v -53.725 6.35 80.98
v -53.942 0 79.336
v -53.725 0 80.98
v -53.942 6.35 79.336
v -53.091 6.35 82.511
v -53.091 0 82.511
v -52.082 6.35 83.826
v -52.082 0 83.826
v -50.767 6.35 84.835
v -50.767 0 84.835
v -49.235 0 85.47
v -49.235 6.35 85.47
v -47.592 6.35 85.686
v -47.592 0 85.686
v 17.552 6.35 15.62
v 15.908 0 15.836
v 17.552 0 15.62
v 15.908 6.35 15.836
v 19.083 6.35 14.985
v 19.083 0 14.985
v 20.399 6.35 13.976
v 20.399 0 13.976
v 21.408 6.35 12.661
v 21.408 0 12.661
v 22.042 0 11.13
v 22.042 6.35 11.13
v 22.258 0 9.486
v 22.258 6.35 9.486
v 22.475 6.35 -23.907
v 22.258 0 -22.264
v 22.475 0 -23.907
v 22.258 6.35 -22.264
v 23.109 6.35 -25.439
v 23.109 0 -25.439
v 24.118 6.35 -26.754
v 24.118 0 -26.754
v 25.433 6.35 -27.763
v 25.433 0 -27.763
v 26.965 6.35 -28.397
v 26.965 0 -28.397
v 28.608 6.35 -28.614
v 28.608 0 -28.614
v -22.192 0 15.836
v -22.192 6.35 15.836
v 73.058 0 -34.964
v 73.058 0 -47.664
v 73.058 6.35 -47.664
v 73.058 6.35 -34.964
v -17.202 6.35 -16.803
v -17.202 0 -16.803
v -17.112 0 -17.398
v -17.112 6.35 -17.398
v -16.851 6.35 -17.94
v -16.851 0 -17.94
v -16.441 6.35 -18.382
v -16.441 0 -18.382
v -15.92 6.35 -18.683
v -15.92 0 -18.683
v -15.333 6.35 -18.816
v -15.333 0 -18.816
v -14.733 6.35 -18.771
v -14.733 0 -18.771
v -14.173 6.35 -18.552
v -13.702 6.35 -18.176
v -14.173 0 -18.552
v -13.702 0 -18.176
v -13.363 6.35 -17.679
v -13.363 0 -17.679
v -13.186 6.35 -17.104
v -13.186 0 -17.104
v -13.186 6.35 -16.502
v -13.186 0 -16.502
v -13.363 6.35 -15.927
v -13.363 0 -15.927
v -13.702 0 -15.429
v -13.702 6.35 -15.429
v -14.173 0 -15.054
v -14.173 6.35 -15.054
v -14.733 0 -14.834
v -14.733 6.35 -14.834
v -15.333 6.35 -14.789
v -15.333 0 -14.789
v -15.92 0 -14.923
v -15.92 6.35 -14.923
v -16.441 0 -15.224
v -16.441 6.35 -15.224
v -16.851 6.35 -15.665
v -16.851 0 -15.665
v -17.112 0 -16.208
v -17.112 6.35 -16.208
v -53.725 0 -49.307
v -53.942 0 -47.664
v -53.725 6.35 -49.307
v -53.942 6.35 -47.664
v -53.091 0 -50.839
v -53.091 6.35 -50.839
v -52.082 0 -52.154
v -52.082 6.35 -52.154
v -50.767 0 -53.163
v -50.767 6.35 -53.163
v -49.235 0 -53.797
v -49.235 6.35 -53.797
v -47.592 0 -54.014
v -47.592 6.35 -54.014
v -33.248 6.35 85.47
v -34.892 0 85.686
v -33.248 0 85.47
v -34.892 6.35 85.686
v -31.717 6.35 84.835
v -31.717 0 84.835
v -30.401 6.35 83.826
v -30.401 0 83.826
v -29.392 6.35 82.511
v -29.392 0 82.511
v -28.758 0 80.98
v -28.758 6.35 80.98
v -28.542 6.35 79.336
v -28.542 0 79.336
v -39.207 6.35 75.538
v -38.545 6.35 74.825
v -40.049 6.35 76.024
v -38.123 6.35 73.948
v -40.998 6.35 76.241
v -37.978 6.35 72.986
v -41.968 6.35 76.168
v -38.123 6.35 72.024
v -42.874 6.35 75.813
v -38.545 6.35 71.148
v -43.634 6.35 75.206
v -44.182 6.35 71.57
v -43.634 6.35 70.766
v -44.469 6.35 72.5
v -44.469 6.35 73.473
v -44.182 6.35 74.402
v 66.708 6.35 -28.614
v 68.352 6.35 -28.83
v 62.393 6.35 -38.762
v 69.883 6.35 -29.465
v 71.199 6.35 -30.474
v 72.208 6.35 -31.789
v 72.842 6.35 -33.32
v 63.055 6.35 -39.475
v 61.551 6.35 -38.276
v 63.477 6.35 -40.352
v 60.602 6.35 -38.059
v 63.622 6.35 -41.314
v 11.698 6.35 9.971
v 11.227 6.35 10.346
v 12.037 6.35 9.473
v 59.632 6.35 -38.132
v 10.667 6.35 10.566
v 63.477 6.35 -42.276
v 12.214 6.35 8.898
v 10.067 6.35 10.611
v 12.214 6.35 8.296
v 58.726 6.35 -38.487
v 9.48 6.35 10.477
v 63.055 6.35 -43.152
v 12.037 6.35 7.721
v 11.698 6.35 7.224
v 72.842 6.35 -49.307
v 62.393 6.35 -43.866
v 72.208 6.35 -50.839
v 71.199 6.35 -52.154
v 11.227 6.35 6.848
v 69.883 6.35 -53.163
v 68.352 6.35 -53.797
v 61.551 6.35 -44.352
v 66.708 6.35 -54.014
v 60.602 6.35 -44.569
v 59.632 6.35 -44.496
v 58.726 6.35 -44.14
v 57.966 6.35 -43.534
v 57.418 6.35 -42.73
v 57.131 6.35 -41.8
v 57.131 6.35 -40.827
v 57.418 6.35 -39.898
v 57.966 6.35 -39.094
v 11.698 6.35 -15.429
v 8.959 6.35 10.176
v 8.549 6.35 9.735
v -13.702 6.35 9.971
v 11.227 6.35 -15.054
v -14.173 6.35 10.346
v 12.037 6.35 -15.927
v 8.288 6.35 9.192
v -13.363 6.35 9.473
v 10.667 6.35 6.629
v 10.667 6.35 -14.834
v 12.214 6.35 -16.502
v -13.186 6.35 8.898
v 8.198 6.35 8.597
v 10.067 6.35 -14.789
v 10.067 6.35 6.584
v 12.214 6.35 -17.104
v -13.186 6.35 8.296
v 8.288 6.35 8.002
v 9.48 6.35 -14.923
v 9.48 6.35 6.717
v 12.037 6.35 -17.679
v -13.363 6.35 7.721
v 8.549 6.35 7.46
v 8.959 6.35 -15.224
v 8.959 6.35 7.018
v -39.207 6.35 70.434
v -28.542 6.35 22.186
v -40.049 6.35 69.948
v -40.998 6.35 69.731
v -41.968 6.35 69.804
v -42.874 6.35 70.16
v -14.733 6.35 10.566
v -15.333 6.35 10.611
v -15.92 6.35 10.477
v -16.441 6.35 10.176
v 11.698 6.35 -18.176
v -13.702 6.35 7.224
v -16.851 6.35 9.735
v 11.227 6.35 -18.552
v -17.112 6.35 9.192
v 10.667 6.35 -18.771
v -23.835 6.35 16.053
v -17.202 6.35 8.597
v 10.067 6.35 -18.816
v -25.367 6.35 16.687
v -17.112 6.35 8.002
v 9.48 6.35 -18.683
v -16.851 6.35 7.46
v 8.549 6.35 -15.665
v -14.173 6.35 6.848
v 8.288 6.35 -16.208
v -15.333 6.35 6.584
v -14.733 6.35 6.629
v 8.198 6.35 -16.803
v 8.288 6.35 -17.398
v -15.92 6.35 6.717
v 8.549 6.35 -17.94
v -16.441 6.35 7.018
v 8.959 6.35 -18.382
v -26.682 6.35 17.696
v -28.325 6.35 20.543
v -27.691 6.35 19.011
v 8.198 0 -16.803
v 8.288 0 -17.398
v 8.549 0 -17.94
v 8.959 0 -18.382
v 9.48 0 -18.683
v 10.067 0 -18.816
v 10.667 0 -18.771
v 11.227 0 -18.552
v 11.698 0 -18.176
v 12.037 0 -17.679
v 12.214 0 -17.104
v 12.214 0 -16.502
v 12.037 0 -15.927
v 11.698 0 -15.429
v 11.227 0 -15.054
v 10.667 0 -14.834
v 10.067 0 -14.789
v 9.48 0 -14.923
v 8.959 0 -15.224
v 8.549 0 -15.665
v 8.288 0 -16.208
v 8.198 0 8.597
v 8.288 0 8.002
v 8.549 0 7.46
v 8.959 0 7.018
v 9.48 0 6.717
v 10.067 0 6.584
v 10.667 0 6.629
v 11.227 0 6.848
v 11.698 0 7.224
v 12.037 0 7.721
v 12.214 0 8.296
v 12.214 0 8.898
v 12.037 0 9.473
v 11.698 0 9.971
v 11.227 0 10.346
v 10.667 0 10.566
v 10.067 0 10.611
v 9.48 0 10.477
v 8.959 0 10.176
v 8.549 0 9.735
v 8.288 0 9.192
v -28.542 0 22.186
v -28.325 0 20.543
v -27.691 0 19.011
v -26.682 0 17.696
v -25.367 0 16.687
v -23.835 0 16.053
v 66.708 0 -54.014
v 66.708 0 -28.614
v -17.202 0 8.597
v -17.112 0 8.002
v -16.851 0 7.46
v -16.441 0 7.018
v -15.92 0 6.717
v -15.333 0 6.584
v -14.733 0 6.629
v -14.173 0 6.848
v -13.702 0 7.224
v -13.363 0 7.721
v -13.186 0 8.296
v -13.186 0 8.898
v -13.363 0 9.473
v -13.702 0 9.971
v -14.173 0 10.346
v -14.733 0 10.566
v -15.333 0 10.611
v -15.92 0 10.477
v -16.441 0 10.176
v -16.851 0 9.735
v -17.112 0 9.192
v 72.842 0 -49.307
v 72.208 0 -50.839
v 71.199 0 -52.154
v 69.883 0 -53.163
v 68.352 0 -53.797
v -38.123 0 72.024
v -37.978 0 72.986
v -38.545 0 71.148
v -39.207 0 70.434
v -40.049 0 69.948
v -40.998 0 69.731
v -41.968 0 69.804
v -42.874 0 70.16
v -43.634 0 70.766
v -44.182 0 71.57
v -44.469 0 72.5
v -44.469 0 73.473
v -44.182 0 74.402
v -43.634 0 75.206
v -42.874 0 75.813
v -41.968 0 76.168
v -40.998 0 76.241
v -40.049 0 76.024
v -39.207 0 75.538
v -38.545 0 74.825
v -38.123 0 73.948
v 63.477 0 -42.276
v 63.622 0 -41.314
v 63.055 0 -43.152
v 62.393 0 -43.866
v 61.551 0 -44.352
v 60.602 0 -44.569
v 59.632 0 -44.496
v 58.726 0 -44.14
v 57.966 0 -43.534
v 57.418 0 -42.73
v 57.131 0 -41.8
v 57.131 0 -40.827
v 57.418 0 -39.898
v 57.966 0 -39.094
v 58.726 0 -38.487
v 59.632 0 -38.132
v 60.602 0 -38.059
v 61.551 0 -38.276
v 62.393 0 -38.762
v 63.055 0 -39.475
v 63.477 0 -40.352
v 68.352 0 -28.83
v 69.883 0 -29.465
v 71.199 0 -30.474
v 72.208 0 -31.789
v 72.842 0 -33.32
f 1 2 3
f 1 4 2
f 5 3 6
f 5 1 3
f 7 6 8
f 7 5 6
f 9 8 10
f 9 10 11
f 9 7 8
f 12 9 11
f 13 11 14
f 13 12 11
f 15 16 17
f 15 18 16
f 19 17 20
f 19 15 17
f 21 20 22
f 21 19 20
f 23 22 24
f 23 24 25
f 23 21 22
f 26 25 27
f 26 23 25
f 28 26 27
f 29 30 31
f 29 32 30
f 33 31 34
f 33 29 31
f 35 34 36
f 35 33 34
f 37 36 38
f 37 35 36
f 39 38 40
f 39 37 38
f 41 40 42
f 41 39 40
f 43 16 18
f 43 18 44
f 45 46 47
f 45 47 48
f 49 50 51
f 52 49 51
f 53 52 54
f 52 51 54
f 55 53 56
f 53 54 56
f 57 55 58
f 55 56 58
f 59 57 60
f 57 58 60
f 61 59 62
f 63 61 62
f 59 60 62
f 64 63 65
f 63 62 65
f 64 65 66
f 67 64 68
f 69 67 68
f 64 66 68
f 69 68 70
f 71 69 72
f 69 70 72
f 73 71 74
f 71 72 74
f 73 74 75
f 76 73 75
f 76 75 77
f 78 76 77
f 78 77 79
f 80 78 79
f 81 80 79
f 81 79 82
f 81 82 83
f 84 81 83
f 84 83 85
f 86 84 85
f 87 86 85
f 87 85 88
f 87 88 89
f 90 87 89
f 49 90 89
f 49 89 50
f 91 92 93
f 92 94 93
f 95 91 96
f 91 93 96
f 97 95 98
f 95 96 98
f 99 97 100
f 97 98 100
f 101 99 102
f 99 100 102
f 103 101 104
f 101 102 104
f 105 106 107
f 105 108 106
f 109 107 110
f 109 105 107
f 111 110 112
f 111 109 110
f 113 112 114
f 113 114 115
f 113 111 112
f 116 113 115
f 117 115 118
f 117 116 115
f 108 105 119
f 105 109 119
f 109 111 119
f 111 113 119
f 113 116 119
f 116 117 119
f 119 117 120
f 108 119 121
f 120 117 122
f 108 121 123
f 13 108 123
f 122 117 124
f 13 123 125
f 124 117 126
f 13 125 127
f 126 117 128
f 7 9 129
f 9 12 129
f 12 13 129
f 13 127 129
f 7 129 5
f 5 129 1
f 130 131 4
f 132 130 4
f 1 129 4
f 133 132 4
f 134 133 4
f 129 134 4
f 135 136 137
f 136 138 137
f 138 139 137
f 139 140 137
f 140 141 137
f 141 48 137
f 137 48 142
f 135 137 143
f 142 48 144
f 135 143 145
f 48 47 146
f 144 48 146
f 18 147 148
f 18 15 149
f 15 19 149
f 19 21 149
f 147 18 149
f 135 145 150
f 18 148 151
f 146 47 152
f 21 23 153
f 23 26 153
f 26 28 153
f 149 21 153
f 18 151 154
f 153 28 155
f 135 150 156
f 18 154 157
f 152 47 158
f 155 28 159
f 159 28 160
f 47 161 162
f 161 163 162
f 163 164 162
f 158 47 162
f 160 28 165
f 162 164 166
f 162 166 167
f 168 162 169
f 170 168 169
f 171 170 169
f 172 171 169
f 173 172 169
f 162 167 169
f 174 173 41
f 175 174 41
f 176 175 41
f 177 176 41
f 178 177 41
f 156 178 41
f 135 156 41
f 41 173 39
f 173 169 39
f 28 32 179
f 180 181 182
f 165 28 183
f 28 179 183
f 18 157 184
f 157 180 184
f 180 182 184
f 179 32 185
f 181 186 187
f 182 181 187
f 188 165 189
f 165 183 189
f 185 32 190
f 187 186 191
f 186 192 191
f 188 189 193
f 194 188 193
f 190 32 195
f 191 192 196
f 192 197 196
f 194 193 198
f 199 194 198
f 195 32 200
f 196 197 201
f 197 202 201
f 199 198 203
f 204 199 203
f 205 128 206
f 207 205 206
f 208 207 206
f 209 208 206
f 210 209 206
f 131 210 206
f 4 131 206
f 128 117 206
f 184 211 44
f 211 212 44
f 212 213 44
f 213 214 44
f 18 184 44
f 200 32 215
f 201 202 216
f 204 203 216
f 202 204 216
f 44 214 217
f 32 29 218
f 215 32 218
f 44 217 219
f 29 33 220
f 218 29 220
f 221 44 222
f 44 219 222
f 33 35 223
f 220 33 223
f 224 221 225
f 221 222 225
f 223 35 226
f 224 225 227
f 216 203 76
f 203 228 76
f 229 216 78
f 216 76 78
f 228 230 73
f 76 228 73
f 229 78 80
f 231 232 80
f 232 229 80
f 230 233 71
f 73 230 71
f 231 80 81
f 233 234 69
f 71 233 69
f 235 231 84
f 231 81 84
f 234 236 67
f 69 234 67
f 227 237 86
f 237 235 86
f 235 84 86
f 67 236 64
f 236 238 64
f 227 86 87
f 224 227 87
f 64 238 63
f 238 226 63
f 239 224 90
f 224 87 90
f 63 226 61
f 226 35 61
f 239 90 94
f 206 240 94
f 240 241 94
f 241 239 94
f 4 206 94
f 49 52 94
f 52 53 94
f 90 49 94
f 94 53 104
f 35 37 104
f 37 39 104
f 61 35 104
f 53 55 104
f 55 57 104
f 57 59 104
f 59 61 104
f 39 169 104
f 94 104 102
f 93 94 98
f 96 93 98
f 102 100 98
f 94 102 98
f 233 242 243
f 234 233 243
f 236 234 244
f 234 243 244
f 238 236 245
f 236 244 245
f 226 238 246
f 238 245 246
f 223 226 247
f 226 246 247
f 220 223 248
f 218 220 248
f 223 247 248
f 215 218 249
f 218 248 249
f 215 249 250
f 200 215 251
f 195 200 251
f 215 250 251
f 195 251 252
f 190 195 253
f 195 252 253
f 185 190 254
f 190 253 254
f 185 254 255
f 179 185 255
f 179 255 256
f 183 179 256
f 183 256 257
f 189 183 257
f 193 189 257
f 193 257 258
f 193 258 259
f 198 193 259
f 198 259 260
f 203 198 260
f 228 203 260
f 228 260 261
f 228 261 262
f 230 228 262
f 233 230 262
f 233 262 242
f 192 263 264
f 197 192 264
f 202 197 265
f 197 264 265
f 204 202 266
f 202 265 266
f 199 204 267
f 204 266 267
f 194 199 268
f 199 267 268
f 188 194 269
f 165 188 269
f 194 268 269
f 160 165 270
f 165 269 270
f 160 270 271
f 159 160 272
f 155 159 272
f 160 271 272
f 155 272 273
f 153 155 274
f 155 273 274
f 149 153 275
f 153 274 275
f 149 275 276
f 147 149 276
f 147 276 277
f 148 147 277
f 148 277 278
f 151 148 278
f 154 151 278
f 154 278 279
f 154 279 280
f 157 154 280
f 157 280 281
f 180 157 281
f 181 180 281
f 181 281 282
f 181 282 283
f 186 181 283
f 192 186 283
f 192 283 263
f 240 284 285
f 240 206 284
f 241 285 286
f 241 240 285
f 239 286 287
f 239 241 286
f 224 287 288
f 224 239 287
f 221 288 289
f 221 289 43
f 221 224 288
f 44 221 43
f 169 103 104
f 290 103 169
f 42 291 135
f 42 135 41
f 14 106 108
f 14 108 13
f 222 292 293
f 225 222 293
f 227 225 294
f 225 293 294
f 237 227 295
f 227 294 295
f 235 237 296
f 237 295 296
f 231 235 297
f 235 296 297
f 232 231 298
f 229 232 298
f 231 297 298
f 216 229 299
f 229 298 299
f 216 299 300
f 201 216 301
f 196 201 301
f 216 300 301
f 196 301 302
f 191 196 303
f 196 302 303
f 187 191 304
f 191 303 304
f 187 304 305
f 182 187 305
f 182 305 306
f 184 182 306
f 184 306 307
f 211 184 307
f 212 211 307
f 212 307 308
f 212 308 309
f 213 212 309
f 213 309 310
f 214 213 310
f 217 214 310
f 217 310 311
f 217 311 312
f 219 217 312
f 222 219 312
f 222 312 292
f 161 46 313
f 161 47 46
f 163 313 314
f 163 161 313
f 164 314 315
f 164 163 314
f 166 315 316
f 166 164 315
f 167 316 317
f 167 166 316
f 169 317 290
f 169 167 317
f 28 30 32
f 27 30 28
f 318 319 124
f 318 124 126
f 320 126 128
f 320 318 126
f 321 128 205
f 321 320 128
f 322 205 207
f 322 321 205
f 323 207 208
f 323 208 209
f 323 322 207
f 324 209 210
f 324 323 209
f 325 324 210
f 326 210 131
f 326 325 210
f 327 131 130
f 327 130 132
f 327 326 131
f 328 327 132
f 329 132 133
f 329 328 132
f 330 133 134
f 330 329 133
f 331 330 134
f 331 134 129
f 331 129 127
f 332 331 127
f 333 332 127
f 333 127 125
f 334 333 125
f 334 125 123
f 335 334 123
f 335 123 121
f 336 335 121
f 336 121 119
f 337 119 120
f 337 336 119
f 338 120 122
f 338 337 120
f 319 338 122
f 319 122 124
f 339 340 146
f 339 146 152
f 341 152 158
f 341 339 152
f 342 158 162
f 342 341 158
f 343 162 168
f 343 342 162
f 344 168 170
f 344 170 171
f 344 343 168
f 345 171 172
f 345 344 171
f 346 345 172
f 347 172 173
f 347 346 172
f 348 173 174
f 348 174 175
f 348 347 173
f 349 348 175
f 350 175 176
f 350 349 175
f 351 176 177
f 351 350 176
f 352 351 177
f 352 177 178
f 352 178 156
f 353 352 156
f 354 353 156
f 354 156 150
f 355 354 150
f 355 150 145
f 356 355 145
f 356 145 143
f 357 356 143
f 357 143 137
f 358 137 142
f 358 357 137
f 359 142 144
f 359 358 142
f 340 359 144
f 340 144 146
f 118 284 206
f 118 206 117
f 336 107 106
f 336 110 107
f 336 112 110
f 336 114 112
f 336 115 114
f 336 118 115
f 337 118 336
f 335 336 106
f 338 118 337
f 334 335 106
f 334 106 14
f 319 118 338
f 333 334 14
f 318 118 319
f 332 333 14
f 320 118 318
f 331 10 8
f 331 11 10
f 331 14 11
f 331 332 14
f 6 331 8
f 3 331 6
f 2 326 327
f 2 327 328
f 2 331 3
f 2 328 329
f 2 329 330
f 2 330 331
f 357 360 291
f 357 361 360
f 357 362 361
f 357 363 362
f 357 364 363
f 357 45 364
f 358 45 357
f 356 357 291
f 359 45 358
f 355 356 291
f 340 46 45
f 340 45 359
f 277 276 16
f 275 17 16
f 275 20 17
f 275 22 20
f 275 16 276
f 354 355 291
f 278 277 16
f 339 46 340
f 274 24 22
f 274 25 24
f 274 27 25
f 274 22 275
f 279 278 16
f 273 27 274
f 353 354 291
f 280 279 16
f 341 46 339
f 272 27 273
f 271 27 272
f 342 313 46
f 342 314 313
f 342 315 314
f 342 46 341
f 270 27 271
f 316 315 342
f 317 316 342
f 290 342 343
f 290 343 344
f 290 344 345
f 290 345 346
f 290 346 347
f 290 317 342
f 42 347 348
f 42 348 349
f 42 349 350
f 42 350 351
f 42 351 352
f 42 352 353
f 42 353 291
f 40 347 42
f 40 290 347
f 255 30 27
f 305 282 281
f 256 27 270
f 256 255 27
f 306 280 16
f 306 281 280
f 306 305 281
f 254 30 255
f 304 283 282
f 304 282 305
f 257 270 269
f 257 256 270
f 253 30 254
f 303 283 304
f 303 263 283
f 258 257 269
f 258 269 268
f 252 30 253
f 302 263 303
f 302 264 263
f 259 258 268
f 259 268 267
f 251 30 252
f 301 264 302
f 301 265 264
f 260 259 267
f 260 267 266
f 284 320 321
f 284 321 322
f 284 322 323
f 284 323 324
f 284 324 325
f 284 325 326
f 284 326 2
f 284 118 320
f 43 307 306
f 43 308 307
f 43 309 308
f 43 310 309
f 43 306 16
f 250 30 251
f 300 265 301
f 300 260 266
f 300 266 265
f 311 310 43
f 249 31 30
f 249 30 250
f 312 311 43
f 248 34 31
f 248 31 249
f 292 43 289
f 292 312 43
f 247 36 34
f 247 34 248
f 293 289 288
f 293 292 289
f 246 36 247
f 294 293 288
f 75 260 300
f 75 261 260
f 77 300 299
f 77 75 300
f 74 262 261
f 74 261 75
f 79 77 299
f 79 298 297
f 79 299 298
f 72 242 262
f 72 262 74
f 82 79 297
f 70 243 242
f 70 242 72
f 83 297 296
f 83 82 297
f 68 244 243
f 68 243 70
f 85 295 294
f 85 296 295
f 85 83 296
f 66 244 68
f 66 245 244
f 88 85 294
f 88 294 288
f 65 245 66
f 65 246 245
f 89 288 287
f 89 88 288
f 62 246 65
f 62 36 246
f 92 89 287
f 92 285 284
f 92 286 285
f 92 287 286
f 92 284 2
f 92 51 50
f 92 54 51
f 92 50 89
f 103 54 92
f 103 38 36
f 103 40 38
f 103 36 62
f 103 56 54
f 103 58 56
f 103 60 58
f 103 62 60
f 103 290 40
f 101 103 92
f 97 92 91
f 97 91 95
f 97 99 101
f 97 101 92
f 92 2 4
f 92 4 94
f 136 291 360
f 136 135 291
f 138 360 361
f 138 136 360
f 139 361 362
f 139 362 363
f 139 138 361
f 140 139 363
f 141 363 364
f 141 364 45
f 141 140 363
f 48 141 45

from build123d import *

# Parameters (mm, degrees)
SKETCH1_R                   = 3.2639
BOSS_EXTRUDE1_DEPTH         = 6.35
FILLET1_R                   = 6.35
FILLET4_R                   = 6.35
FILLET5_R                   = 6.35
FILLET6_R                   = 6.35
FILLET9_R                   = 6.35
FILLET10_R                  = 6.35
FILLET11_R                  = 6.35
FILLET12_R                  = 6.35
F_21_0_159_DIAMETER_HOLE1_D = 4.0386


with BuildPart() as part:
    # Sketch1 → Boss-Extrude1 (new body)
    with BuildSketch(Plane(origin=(0, 0, 0), x_dir=(1, 0, 0), z_dir=(0, 1, 0))):
        Polygon((-53.941595929, 54.013787086), (73.058404071, 54.013787086), (73.058404071, 28.613787086), (22.258404071, 28.613787086), (22.258404071, -15.836212914), (-28.541595929, -15.836212914), (-28.541595929, -85.686212914), (-53.941595929, -85.686212914), align=None)
        with Locations((-41.241595929, -72.986212914)):
            Circle(SKETCH1_R, mode=Mode.SUBTRACT)
        with Locations((60.358404071, 41.313787086)):
            Circle(SKETCH1_R, mode=Mode.SUBTRACT)
    extrude(amount=BOSS_EXTRUDE1_DEPTH)

    # Fillet1
    fillet1_edges = [part.edges().sort_by_distance(p)[0] for p in [
        (-28.541595929, 3.175, 15.836212914),
    ]]
    fillet(fillet1_edges, radius=FILLET1_R)

    # Fillet4
    fillet4_edges = [part.edges().sort_by_distance(p)[0] for p in [
        (-53.941595929, 3.175, -54.013787086),
    ]]
    fillet(fillet4_edges, radius=FILLET4_R)

    # Fillet5
    fillet5_edges = [part.edges().sort_by_distance(p)[0] for p in [
        (-53.941595929, 3.175, 85.686212914),
    ]]
    fillet(fillet5_edges, radius=FILLET5_R)

    # Fillet6
    fillet6_edges = [part.edges().sort_by_distance(p)[0] for p in [
        (-28.541595929, 3.175, 85.686212914),
    ]]
    fillet(fillet6_edges, radius=FILLET6_R)

    # Fillet9
    fillet9_edges = [part.edges().sort_by_distance(p)[0] for p in [
        (22.258404071, 3.175, 15.836212914),
    ]]
    fillet(fillet9_edges, radius=FILLET9_R)

    # Fillet10
    fillet10_edges = [part.edges().sort_by_distance(p)[0] for p in [
        (22.258404071, 3.175, -28.613787086),
    ]]
    fillet(fillet10_edges, radius=FILLET10_R)

    # Fillet11
    fillet11_edges = [part.edges().sort_by_distance(p)[0] for p in [
        (73.058404071, 3.175, -28.613787086),
    ]]
    fillet(fillet11_edges, radius=FILLET11_R)

    # Fillet12
    fillet12_edges = [part.edges().sort_by_distance(p)[0] for p in [
        (73.058404071, 3.175, -54.013787086),
    ]]
    fillet(fillet12_edges, radius=FILLET12_R)

    # #21 (0.159) Diameter Hole1 (through all)
    with Locations(Plane(origin=(0, 6.35, 0), x_dir=(1, 0, 0), z_dir=(0, 1, 0))):
        with Locations((-15.182373473, 16.802787086), (-15.182373473, -8.597212914), (10.217626527, -8.597212914), (10.217626527, 16.802787086)):
            Hole(F_21_0_159_DIAMETER_HOLE1_D / 2)


solid = part.part
